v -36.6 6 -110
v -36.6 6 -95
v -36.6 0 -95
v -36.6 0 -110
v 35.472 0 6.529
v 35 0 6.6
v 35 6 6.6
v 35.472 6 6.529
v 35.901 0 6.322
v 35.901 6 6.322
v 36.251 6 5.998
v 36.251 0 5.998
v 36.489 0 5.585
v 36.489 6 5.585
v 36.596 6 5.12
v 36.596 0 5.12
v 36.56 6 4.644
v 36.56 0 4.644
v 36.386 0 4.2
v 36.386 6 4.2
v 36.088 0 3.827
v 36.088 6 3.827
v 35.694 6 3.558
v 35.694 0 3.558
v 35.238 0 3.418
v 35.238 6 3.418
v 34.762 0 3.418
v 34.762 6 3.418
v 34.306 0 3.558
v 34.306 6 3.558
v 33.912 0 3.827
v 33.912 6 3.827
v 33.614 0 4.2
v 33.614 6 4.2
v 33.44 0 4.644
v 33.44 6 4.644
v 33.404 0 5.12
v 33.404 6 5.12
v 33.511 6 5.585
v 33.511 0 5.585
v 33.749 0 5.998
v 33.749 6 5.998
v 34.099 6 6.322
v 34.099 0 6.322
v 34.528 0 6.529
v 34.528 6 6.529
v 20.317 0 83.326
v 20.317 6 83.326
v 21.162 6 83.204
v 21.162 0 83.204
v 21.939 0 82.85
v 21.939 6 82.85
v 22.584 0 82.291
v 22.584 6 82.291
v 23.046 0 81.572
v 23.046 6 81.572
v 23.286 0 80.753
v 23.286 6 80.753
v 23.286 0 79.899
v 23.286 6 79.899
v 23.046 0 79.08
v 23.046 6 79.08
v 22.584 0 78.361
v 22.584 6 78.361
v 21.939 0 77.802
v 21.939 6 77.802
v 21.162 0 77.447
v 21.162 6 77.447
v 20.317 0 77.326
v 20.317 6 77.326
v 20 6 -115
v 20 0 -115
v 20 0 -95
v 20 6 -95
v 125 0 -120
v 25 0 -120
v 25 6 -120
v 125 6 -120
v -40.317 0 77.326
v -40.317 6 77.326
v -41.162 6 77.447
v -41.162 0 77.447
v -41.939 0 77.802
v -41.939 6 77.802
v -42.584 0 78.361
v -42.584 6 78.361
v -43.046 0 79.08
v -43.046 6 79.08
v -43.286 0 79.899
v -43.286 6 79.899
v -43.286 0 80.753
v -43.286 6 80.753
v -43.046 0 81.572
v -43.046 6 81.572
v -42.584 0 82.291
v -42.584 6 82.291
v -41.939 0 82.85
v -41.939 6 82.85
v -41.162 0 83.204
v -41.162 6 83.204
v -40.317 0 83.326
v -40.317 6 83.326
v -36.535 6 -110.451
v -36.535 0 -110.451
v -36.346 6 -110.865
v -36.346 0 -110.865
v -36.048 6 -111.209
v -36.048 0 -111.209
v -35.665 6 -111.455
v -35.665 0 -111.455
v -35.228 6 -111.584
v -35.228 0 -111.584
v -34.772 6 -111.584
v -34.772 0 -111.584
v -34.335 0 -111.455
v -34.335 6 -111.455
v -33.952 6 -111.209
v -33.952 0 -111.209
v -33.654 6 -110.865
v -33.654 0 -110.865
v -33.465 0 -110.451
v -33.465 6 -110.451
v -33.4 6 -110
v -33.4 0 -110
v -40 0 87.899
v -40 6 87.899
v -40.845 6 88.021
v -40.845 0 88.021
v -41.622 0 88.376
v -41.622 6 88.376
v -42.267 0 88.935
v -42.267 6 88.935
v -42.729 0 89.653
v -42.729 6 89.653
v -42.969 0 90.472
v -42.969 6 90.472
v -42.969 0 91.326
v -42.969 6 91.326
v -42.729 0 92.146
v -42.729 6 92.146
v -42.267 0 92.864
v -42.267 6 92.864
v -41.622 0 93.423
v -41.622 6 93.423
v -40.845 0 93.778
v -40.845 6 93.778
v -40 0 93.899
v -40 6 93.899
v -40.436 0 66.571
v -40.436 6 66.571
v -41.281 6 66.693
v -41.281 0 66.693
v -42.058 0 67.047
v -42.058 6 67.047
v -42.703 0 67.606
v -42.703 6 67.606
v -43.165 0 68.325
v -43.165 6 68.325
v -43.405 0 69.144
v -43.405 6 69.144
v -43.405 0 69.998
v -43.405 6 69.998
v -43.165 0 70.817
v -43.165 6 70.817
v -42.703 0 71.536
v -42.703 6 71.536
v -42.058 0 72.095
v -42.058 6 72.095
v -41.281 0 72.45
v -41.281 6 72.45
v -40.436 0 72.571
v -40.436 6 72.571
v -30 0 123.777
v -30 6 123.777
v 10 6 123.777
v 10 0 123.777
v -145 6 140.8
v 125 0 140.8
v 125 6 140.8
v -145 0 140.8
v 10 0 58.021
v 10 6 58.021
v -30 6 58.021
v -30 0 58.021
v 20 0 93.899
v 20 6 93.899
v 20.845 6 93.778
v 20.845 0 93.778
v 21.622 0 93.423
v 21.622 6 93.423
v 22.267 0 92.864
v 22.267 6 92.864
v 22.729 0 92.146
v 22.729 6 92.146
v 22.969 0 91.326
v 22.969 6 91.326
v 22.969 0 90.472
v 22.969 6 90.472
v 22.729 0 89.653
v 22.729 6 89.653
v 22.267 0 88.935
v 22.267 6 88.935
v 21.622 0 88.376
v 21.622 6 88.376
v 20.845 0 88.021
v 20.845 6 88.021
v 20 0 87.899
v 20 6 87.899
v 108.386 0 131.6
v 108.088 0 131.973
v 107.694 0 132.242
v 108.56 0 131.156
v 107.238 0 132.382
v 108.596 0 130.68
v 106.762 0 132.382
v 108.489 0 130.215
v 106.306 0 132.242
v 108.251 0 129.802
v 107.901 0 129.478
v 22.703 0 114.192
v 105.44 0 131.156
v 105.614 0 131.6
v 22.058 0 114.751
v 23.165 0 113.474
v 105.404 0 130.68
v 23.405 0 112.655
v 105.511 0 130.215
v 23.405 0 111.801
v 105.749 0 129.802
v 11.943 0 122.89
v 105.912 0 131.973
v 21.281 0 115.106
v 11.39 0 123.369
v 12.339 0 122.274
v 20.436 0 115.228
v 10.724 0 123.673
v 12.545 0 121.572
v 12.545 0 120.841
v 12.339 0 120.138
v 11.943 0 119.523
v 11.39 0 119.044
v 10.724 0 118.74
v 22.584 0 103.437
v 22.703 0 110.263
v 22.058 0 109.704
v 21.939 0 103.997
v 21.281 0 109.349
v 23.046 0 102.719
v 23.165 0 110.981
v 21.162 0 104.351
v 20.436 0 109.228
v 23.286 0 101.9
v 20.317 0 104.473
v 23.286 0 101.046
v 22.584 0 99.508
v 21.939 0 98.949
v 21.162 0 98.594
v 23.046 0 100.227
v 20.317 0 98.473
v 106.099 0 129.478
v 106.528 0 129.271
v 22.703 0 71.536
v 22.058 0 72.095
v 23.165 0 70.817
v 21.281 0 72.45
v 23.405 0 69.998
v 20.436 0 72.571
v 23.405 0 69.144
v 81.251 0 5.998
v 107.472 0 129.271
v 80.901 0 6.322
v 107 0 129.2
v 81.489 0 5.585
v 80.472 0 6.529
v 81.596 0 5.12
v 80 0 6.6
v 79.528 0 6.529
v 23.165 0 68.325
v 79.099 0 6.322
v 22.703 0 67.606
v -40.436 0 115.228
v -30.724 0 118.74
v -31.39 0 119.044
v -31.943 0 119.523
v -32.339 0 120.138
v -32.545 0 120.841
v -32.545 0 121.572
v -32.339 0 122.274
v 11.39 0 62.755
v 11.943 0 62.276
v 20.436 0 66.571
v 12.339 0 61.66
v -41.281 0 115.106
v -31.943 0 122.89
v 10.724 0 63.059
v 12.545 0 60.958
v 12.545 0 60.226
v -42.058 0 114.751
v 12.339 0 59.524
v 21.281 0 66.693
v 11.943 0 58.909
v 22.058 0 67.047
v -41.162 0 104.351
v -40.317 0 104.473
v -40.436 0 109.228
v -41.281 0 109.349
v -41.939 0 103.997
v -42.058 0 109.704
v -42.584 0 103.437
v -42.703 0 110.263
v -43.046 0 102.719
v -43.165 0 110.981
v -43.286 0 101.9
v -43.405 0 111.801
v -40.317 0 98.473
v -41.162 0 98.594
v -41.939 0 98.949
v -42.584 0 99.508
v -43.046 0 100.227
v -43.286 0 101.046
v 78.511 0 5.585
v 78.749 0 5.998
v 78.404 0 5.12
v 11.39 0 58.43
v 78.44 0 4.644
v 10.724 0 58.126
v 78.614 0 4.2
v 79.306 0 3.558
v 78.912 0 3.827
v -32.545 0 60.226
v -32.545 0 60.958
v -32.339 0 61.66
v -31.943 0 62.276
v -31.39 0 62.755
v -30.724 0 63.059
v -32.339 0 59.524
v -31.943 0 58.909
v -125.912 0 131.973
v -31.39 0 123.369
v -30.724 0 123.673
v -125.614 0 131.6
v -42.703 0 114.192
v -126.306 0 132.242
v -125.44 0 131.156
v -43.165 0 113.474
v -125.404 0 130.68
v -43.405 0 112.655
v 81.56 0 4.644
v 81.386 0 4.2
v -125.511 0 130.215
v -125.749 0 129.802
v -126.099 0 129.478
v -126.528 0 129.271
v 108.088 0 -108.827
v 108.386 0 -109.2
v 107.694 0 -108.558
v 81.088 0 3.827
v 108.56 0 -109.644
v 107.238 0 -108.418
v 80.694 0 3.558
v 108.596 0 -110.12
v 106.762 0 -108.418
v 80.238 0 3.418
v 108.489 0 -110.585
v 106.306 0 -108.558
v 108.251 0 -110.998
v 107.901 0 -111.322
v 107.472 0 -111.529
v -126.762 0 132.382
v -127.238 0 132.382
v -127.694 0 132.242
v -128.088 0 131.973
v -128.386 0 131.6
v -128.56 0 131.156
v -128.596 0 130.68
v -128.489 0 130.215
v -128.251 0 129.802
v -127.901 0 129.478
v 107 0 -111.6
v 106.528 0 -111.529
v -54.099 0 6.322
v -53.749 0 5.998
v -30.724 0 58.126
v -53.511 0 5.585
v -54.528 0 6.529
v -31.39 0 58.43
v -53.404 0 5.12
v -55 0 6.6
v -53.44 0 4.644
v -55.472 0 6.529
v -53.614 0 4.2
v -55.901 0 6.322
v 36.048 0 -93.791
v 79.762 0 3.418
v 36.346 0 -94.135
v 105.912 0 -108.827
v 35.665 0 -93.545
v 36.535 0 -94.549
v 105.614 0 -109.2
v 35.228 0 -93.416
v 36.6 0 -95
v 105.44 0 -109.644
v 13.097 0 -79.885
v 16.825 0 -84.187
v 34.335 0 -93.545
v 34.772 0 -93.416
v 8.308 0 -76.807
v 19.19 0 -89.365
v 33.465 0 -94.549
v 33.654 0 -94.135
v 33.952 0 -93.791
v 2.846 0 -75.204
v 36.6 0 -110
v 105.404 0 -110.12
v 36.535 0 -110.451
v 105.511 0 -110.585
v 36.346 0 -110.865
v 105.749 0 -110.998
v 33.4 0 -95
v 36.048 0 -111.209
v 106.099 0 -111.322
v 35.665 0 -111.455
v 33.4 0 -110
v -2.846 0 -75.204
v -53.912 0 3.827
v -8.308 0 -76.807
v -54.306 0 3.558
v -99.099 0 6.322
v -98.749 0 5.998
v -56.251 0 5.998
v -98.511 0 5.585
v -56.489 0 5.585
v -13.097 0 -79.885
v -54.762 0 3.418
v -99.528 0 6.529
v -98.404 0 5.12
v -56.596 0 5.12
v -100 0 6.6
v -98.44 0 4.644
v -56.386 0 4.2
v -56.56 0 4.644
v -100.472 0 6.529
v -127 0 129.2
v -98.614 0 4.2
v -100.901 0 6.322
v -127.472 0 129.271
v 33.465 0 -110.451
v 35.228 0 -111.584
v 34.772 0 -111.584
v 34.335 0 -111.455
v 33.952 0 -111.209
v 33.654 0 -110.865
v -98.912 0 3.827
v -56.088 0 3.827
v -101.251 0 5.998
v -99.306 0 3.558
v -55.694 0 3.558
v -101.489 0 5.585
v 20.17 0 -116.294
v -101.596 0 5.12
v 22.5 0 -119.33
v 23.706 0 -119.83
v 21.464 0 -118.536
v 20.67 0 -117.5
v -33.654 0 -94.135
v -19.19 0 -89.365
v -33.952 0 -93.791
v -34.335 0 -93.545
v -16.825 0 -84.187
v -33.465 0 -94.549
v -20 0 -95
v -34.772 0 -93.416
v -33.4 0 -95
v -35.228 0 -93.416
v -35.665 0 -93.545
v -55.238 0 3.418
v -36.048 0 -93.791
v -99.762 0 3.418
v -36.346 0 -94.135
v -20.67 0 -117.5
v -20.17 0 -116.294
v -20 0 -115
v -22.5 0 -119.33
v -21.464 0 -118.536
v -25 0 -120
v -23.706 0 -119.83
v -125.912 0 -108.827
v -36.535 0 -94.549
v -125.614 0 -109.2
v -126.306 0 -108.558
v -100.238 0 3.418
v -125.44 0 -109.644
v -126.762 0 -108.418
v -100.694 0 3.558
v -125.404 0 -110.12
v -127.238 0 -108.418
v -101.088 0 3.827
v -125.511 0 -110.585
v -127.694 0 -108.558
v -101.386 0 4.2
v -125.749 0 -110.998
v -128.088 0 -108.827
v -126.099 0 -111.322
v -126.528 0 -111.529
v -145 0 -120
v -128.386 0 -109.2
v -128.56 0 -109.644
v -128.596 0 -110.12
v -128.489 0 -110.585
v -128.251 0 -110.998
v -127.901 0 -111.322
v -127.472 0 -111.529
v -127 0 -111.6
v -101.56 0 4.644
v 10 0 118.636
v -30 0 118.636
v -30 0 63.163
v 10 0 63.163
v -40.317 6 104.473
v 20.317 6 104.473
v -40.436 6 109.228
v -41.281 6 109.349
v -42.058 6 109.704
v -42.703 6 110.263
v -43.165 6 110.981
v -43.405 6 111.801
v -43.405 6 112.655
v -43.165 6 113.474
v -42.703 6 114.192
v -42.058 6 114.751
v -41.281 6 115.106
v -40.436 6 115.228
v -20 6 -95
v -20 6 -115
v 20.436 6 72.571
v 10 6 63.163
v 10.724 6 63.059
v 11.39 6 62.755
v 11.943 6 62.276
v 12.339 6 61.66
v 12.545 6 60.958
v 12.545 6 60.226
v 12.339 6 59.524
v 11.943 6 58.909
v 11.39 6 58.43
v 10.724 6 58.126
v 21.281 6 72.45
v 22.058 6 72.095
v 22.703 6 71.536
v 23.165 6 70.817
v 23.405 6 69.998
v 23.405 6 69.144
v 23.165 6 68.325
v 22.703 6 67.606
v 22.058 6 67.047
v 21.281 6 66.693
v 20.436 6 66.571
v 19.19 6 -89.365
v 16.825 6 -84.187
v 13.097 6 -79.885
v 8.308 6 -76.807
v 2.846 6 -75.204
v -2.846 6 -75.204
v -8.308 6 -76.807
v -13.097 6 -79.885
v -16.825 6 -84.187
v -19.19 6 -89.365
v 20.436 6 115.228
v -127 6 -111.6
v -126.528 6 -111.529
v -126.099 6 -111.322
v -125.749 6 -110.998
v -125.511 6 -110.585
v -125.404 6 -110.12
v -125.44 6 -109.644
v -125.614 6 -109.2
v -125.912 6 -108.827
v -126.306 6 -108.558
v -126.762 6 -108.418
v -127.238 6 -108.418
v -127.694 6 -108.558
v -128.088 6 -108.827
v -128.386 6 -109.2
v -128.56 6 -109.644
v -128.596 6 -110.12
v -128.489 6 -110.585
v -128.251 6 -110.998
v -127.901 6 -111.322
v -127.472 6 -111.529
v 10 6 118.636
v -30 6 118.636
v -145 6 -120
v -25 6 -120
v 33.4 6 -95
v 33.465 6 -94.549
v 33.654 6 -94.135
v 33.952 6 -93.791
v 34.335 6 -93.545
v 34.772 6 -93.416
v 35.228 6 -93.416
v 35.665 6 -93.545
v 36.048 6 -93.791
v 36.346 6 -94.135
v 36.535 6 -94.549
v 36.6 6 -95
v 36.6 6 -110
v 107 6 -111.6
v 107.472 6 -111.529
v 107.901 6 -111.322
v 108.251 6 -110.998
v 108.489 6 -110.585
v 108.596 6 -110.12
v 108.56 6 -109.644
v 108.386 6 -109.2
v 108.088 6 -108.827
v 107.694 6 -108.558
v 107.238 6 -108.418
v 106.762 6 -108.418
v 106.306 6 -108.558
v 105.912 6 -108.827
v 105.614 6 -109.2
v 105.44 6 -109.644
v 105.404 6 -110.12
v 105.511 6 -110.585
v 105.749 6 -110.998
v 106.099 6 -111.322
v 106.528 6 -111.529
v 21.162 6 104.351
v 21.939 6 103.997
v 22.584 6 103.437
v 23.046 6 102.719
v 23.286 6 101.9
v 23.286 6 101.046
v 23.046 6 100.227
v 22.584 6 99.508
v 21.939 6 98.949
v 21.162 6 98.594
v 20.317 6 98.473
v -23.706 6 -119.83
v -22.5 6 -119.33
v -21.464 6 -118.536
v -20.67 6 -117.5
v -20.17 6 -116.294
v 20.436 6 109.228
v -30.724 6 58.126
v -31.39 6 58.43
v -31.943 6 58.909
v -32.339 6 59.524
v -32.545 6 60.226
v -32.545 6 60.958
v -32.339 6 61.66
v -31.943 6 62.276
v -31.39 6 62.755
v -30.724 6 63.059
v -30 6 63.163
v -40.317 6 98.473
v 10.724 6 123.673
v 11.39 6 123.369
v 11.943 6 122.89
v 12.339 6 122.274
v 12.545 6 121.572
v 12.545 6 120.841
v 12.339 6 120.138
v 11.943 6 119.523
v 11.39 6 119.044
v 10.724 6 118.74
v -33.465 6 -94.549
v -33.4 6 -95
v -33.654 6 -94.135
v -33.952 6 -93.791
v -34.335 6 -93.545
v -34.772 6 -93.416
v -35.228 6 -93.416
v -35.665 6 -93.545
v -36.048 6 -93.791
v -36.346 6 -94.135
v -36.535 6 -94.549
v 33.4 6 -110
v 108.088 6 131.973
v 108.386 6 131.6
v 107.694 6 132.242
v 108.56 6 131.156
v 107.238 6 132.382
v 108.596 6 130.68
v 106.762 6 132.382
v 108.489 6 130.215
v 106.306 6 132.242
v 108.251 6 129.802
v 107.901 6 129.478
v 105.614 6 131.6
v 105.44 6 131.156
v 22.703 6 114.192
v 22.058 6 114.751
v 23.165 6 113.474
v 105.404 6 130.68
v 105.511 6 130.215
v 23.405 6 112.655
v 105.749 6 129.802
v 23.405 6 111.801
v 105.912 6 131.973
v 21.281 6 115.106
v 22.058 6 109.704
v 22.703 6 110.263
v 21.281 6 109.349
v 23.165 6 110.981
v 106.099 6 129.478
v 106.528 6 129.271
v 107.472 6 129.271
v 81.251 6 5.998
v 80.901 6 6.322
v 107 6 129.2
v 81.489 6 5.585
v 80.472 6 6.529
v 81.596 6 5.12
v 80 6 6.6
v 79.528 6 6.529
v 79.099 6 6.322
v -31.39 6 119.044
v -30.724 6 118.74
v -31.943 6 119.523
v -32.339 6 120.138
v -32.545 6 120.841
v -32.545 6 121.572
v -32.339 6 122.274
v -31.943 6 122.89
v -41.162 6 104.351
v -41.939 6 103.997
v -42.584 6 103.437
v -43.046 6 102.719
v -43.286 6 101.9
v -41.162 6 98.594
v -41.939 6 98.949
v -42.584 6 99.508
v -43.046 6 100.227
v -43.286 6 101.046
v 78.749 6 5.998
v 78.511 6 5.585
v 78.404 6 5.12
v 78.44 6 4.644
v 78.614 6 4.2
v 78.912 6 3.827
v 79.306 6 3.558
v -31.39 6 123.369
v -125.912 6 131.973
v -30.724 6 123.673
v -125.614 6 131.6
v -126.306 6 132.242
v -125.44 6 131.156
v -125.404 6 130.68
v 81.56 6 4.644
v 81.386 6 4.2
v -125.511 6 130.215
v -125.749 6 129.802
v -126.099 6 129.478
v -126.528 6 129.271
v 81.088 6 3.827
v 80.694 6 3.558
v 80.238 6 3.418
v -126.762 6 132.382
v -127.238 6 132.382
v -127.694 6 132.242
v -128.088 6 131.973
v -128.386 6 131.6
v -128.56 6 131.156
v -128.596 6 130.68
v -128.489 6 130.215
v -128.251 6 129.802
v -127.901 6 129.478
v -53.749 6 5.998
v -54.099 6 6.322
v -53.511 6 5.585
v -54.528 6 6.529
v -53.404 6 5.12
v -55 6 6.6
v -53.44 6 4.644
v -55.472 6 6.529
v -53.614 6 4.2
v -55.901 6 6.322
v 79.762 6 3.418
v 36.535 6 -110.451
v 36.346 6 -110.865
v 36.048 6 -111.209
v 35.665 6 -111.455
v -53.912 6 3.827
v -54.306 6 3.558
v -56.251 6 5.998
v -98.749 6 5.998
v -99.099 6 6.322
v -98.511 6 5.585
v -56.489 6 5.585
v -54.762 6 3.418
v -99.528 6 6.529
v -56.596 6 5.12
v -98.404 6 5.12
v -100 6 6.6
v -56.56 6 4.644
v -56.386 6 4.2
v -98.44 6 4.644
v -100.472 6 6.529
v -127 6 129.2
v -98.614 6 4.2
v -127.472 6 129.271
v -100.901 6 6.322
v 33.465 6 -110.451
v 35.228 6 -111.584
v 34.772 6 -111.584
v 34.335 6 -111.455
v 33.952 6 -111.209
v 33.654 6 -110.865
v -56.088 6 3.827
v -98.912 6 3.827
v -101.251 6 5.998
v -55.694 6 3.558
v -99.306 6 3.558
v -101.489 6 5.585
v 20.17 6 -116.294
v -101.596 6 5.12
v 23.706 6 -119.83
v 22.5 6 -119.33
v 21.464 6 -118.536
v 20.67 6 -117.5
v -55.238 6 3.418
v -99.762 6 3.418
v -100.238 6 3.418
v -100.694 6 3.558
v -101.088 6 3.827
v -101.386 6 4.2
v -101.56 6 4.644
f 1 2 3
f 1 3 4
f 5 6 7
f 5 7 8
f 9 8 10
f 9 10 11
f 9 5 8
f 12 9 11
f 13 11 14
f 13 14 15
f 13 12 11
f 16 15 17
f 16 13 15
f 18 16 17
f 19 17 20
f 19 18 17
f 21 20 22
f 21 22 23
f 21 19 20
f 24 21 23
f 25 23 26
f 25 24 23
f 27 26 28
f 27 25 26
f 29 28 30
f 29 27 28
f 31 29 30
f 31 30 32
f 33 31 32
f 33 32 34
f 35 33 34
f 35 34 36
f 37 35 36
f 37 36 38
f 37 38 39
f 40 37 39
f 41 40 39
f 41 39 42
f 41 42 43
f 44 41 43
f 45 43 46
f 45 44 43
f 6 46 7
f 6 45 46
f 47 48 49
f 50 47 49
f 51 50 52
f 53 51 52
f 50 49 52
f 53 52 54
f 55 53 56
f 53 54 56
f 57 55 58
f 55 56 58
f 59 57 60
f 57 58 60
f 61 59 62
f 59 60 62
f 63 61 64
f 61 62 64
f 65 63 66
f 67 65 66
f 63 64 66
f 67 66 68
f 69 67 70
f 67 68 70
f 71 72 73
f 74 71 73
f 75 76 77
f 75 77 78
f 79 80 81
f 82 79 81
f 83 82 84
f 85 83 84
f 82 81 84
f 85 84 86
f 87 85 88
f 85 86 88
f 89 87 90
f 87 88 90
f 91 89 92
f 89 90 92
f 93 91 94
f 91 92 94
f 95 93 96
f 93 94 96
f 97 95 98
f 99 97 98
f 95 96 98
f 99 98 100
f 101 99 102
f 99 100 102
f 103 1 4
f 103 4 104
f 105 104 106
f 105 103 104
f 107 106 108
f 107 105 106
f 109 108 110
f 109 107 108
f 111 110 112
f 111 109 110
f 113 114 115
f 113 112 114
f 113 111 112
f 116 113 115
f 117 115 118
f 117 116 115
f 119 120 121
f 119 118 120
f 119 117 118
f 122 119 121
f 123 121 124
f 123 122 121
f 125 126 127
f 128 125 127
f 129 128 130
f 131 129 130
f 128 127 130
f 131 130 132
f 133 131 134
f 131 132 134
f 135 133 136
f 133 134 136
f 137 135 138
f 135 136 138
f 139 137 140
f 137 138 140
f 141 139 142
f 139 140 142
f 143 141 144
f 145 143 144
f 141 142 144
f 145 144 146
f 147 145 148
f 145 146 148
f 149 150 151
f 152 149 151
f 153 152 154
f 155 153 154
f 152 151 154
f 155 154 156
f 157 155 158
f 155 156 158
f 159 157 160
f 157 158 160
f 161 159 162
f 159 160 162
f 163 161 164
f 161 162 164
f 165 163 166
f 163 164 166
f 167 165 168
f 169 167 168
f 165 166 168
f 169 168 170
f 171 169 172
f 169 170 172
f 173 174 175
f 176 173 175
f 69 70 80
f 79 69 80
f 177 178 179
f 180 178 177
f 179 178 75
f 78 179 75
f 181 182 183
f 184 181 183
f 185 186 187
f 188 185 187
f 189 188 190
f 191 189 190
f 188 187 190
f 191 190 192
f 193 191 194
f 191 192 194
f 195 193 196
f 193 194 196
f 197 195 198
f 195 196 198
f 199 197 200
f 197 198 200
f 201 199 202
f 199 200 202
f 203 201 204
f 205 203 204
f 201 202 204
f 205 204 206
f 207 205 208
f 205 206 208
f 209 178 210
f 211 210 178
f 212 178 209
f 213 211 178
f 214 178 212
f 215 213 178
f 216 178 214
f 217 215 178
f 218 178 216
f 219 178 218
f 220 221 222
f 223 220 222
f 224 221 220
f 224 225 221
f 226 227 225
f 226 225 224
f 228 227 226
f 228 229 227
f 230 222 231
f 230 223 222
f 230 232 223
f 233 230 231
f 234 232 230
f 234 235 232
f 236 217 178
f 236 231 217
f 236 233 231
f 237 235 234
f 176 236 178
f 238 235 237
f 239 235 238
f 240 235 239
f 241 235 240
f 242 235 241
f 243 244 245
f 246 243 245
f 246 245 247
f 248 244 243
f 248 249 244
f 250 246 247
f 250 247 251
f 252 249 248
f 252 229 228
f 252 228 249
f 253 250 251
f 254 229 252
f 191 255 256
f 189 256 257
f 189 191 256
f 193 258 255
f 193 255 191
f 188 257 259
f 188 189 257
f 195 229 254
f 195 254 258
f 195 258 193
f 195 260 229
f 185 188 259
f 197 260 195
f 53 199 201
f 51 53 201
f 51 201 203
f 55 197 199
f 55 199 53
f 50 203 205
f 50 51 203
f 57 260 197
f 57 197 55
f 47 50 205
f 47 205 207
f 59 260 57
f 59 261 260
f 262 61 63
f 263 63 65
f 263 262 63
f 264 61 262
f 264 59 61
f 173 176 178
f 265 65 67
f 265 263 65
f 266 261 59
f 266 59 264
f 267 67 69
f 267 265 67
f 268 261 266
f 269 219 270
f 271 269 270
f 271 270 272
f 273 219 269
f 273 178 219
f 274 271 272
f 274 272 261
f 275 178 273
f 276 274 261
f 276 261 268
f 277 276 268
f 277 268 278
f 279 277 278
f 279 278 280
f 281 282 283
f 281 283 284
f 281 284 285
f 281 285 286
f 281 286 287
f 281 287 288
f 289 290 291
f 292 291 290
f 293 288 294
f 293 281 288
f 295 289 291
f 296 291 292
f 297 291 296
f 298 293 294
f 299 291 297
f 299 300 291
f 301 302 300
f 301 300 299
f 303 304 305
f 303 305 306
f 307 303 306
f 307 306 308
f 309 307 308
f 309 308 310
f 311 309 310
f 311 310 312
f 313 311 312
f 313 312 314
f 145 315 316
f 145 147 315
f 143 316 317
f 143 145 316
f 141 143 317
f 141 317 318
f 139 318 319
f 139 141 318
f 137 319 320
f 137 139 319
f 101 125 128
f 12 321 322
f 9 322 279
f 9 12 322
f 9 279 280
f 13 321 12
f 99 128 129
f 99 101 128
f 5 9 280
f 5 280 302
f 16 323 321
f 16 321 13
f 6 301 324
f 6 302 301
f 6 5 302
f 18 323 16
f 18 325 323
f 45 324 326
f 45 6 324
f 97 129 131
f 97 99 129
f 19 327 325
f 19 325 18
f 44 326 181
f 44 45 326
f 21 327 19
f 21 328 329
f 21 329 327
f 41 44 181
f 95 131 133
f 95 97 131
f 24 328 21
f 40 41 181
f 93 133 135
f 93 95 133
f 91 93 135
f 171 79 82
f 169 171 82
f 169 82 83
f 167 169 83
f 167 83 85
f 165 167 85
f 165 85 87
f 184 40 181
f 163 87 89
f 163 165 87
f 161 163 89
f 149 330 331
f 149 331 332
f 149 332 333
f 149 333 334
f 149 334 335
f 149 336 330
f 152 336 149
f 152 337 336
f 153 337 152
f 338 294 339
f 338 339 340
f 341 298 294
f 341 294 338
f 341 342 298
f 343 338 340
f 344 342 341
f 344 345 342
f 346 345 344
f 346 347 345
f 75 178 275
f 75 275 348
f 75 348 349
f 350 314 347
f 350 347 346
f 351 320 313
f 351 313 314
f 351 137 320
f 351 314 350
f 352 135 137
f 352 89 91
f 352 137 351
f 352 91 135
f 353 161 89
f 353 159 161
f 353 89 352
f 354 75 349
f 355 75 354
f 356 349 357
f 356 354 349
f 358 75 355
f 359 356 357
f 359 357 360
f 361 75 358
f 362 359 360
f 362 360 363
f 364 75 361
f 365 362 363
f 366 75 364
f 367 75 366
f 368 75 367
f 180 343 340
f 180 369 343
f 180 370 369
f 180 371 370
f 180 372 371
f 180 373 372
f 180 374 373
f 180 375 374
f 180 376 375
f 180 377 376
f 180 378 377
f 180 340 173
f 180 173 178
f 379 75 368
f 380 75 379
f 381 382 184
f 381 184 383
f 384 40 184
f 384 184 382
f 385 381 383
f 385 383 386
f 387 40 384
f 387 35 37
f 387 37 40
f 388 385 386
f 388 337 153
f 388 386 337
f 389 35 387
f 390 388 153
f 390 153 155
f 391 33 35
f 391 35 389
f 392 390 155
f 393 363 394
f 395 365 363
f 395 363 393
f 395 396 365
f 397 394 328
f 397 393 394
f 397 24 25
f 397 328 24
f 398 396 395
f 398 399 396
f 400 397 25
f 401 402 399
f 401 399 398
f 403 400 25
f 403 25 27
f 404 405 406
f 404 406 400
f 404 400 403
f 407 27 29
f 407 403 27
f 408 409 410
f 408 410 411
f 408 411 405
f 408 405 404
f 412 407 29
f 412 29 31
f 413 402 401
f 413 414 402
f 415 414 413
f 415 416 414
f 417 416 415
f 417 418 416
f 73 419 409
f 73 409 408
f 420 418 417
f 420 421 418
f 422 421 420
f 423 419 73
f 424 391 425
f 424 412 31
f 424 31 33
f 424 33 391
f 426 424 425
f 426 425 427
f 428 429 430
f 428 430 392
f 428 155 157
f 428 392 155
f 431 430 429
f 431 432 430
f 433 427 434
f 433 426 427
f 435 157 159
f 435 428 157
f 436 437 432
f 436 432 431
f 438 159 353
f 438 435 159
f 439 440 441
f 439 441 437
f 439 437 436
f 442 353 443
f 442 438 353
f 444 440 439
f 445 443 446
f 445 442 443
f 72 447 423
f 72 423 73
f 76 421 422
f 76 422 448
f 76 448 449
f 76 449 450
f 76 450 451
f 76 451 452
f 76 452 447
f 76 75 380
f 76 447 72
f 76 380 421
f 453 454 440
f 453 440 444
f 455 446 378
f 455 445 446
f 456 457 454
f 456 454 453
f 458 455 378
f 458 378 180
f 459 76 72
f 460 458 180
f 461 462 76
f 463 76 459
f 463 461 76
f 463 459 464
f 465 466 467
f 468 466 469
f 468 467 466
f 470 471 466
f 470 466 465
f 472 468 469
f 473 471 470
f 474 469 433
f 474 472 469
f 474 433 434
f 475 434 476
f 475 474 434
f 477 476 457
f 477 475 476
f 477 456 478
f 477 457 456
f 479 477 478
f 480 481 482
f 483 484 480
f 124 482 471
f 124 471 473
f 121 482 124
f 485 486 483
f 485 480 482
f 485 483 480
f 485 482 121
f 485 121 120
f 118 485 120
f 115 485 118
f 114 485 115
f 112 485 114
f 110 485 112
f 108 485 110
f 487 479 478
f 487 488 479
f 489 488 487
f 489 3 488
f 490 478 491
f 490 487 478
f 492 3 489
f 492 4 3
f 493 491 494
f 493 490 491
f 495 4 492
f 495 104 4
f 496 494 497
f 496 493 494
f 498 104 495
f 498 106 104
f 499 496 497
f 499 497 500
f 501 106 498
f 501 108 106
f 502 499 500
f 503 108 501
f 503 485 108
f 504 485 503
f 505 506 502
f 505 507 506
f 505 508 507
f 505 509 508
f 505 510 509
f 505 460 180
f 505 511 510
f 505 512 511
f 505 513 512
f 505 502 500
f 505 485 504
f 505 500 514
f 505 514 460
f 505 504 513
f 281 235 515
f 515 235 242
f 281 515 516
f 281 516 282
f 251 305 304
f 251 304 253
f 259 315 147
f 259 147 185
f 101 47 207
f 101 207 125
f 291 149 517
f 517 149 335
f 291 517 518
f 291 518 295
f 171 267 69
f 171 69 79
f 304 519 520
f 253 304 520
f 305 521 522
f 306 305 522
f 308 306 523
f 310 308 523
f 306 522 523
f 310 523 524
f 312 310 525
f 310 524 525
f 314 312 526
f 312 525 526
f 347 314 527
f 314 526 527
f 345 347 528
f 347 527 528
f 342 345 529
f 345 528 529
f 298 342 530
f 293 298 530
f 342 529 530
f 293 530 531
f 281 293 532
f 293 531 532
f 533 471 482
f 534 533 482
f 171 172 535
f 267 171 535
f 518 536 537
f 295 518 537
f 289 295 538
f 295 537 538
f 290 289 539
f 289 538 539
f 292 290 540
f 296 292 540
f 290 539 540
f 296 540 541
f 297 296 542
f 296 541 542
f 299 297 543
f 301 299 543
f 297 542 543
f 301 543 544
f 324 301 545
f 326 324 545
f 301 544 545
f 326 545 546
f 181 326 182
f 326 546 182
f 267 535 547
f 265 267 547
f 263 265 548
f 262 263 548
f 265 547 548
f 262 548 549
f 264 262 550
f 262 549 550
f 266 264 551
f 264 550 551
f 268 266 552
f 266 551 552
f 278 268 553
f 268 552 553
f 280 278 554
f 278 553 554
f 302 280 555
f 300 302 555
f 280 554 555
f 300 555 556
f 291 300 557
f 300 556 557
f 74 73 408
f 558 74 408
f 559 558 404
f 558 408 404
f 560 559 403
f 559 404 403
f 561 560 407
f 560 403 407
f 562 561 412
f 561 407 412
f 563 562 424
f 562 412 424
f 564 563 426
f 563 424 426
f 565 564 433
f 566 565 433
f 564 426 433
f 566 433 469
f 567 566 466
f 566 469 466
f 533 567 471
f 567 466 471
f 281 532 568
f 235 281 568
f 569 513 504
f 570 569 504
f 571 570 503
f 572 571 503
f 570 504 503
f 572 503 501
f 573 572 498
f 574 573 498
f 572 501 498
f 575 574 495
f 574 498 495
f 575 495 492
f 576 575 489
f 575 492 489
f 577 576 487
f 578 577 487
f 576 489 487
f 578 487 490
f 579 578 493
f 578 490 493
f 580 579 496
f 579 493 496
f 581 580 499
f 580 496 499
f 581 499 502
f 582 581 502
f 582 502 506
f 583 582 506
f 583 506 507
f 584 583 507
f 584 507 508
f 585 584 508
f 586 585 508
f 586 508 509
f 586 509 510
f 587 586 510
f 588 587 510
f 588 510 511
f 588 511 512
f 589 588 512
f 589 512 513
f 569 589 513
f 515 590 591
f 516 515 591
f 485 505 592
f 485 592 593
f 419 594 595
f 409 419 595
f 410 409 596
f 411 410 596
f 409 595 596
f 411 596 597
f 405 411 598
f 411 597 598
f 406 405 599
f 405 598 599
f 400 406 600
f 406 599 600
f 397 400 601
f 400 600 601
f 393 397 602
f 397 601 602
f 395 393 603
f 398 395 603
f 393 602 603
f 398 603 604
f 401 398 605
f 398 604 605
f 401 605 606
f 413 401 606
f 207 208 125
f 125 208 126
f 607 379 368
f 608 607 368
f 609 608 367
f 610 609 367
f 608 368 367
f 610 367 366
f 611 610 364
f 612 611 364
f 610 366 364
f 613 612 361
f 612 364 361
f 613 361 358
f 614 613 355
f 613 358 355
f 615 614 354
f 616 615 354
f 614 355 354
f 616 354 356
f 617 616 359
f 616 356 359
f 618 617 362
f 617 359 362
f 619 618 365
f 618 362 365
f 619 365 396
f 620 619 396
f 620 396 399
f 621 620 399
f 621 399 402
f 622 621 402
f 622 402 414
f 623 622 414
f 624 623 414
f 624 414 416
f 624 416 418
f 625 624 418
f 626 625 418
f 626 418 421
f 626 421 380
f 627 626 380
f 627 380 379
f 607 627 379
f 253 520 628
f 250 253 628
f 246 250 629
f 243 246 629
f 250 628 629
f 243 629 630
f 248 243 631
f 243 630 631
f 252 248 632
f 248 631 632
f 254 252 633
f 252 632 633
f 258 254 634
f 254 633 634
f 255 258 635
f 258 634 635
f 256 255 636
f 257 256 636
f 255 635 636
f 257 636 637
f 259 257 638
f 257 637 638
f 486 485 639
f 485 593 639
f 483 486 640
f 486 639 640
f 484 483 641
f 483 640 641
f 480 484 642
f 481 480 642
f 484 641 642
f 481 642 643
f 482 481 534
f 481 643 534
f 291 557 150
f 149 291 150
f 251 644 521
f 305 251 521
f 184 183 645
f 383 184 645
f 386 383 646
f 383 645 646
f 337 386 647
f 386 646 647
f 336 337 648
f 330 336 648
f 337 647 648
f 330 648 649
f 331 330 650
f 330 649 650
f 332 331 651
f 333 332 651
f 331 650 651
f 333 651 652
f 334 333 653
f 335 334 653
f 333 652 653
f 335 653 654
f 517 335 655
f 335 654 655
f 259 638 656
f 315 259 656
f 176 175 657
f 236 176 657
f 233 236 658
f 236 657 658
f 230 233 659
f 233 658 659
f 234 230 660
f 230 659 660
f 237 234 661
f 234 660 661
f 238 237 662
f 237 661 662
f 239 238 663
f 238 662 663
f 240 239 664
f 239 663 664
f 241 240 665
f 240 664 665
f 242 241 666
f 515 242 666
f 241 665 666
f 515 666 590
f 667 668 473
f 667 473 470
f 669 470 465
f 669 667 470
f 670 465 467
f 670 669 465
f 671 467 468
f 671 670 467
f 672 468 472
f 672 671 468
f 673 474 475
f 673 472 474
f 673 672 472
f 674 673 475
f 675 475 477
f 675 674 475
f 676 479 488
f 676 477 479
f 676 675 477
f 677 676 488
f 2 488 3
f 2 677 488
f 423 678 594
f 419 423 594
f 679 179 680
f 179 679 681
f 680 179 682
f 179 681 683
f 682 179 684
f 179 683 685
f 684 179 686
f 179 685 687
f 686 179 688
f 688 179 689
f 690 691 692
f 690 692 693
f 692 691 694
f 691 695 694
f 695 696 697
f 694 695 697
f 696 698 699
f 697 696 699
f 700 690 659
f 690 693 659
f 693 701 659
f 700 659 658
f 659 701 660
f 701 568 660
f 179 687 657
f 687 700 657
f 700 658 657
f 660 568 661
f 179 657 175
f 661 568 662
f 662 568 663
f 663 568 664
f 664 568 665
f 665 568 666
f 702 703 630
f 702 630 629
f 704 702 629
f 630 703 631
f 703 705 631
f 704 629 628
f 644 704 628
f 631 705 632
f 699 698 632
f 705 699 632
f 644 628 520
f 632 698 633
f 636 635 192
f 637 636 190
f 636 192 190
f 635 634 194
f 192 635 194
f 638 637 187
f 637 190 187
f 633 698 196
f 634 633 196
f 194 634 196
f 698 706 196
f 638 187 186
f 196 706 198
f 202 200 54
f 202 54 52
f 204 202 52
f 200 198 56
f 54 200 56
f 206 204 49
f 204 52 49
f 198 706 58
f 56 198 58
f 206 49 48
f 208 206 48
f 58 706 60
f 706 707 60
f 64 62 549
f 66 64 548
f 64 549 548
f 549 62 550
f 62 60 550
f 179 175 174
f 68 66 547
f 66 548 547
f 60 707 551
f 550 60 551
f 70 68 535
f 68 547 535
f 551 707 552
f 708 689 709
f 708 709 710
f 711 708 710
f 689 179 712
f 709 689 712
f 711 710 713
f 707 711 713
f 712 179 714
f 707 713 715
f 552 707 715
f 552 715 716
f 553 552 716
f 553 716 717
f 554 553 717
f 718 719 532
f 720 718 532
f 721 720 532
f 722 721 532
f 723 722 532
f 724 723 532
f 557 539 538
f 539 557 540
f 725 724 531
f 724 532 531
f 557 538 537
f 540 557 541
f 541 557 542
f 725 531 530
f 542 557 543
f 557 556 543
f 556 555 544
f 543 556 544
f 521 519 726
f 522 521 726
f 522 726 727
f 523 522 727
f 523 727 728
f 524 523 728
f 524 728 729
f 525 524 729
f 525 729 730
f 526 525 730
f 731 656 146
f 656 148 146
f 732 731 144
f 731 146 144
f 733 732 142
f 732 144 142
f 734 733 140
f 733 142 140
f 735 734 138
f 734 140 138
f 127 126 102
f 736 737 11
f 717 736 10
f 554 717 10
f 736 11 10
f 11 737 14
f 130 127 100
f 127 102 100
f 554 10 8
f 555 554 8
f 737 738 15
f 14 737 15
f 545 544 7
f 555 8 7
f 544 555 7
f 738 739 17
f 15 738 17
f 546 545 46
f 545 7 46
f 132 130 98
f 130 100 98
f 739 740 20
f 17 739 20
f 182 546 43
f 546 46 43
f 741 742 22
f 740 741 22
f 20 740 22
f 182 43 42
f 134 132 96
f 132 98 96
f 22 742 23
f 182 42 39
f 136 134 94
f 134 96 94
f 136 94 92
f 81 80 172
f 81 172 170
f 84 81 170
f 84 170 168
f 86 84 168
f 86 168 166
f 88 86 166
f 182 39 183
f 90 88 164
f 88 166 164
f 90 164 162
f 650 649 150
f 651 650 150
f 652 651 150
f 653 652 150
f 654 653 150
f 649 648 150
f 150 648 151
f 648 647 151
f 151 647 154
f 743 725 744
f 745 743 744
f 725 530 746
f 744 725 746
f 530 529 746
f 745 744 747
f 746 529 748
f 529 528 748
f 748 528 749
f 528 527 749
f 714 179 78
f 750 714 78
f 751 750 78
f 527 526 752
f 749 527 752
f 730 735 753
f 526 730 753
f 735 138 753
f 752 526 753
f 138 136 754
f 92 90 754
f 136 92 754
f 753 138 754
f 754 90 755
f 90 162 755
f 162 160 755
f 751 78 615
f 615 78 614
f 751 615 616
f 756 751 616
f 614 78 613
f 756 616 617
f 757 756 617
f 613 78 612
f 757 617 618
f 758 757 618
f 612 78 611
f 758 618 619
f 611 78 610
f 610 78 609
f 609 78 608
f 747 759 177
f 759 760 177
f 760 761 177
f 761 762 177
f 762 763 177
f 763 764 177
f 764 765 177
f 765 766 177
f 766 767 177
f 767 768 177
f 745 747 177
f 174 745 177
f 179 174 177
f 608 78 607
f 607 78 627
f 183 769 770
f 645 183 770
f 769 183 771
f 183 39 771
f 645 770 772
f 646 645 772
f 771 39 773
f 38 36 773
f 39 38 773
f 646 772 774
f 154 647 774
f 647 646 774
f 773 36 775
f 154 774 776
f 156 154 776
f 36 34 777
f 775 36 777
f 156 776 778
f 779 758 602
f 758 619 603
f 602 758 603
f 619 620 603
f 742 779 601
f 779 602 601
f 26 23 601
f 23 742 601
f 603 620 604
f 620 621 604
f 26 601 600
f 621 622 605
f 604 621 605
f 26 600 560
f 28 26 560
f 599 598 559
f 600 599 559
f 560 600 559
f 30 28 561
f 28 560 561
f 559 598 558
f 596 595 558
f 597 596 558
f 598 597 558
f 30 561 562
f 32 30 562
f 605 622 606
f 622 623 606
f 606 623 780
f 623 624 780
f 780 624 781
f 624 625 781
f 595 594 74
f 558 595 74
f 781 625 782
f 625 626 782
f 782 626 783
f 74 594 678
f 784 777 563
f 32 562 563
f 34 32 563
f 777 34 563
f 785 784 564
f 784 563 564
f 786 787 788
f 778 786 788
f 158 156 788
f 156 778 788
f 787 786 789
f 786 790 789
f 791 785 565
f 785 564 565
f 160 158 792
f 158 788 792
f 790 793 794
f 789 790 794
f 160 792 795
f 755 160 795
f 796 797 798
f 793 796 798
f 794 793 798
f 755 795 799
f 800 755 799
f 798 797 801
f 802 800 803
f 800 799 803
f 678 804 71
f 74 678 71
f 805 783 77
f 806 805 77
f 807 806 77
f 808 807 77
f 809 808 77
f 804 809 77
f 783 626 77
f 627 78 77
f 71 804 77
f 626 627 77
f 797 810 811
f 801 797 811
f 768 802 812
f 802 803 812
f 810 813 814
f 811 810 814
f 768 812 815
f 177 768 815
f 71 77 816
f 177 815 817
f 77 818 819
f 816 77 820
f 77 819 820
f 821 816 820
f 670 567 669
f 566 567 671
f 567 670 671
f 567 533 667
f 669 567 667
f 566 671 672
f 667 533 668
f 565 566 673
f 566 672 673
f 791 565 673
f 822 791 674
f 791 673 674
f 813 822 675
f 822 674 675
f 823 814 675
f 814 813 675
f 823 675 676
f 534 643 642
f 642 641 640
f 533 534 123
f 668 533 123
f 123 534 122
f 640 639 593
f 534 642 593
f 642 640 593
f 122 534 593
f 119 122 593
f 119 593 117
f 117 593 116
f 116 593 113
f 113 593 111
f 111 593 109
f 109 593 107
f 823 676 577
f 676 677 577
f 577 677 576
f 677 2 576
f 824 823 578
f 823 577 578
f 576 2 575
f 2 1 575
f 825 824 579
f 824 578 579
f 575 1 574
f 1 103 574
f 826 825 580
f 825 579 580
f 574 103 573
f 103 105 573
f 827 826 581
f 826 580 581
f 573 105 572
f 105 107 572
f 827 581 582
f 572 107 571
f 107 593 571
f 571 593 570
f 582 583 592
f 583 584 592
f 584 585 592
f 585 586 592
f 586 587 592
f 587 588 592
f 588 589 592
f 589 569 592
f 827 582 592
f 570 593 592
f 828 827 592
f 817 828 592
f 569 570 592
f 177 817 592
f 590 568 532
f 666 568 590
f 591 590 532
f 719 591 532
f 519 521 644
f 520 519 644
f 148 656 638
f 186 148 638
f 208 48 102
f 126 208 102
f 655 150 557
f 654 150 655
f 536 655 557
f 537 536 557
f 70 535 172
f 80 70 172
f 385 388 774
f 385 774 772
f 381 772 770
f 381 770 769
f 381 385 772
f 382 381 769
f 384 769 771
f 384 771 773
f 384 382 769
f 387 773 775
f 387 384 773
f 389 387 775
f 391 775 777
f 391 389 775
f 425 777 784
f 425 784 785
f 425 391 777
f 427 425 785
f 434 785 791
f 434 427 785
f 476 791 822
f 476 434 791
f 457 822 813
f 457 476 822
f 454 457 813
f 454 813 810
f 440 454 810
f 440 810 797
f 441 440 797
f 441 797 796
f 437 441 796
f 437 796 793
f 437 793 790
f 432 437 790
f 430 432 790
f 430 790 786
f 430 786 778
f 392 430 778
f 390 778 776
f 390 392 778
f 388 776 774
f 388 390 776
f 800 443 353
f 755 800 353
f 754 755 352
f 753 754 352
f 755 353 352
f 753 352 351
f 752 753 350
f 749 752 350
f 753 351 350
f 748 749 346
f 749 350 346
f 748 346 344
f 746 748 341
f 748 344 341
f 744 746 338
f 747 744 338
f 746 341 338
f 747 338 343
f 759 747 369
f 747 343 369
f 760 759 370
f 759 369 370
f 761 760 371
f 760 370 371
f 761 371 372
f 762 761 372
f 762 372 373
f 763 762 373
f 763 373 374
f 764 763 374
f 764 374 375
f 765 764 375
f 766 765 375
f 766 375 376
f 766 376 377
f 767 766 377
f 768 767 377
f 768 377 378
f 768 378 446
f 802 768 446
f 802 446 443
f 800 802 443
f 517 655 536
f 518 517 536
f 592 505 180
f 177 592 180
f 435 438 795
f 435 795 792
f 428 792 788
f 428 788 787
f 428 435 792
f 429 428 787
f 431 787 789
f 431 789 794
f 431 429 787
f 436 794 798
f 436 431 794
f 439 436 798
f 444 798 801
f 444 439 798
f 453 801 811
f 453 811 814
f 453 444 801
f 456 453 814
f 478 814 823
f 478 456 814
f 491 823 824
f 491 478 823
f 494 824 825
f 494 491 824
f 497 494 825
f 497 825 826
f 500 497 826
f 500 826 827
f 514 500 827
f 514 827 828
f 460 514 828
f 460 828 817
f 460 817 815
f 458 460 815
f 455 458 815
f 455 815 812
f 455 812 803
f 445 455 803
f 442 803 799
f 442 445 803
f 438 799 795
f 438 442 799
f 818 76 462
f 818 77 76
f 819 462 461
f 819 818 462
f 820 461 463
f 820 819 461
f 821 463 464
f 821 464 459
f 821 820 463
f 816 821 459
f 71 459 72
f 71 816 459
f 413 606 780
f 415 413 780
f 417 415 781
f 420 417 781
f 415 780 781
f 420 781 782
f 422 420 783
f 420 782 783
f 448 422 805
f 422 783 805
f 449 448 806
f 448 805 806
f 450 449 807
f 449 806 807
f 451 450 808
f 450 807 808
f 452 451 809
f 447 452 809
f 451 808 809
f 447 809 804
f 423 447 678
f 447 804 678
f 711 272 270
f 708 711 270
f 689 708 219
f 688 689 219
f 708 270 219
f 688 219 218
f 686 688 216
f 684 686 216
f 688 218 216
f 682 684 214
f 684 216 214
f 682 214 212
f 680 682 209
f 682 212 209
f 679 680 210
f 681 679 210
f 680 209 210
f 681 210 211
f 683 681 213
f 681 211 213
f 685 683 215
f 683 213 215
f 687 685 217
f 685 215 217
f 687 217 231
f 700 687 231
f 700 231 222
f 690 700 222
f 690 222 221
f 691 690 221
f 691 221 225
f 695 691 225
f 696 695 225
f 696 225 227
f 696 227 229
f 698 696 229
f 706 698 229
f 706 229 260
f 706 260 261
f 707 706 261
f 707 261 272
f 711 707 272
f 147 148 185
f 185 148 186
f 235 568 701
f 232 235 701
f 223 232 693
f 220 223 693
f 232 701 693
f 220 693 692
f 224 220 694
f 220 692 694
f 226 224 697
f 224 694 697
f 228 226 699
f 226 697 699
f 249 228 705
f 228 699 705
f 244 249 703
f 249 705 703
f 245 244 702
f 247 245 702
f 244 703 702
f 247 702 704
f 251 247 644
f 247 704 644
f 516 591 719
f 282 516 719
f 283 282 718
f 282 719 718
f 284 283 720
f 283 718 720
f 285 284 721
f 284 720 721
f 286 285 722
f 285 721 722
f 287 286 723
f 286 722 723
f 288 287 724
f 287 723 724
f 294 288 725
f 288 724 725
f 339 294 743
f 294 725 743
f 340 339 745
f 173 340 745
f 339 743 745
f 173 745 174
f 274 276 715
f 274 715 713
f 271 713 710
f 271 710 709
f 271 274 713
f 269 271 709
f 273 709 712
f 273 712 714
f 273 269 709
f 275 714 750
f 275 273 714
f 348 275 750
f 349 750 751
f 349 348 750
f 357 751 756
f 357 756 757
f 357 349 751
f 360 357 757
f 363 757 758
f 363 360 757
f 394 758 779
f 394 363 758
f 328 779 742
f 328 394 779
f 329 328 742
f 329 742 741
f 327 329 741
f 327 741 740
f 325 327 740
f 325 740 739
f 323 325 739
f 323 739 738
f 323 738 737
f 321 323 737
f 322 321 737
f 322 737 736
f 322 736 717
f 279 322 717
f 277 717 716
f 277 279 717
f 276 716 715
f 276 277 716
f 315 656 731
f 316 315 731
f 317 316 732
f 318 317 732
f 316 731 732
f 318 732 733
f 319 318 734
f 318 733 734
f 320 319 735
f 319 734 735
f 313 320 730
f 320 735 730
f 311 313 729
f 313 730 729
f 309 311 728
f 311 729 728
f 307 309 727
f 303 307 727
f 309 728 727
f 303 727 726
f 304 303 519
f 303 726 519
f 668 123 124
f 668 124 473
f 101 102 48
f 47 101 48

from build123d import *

# Parameters (mm, degrees)
SKETCH1_R               = 1.6
BOSS_EXTRUDE1_DEPTH     = 6
CUT_EXTRUDE1_DEPTH      = 203.20197823
CUT_EXTRUDE1_DEPTH_BACK = 203.20197823
SKETCH4_R               = 1.6
CUT_EXTRUDE2_DEPTH      = 10
CUT_EXTRUDE3_DEPTH      = 10
FILLET1_R               = 5
CUT_EXTRUDE4_DEPTH      = 10
CUT_EXTRUDE4_DEPTH_BACK = 10


with BuildPart() as part:
    # Sketch1 → Boss-Extrude1 (new body)
    with BuildSketch(Plane(origin=(0, 0, 0), x_dir=(1, 0, 0), z_dir=(0, 1, 0))):
        Polygon((-145, 120), (125, 120), (125, -100.8), (125, -140.8), (-145, -140.8), (-145, -100.8), align=None)
        with Locations((-100, -5)):
            Circle(SKETCH1_R, mode=Mode.SUBTRACT)
        with Locations((80, -5)):
            Circle(SKETCH1_R, mode=Mode.SUBTRACT)
        with Locations((-55, -5)):
            Circle(SKETCH1_R, mode=Mode.SUBTRACT)
        with Locations((35, -5)):
            Circle(SKETCH1_R, mode=Mode.SUBTRACT)
    extrude(amount=BOSS_EXTRUDE1_DEPTH)

    # Sketch3 → Cut-Extrude1 (cut, two sides: drawn at the far end of the back side and taken through both)
    with BuildSketch(Plane(origin=(0, 6, 0), x_dir=(1, 0, 0), z_dir=(0, 1, 0)).offset(-CUT_EXTRUDE1_DEPTH_BACK)):
        with BuildLine():
            Line((-20, 95), (-20, 120))
            Line((-20, 120), (20, 120))
            Line((20, 120), (20, 95))
            ThreePointArc((20, 95), (0, 75), (-20, 95))
        make_face()
    extrude(amount=CUT_EXTRUDE1_DEPTH + CUT_EXTRUDE1_DEPTH_BACK, mode=Mode.SUBTRACT)

    # Sketch4 → Cut-Extrude2 (cut)
    with BuildSketch(Plane.XZ):
        with Locations((107, -110)):
            Circle(SKETCH4_R)
        with Locations((-127, -110)):
            Circle(SKETCH4_R)
        with Locations((107, 130.8)):
            Circle(SKETCH4_R)
        with Locations((-127, 130.8)):
            Circle(SKETCH4_R)
    extrude(amount=-CUT_EXTRUDE2_DEPTH, mode=Mode.SUBTRACT)

    # Sketch5 → Cut-Extrude3 (cut)
    with BuildSketch(Plane(origin=(0, 6, 0), x_dir=(1, 0, 0), z_dir=(0, 1, 0))):
        with BuildLine():
            Line((-33.4, 110), (-33.4, 95))
            ThreePointArc((-33.4, 95), (-35, 93.4), (-36.6, 95))
            Line((-36.6, 95), (-36.6, 110))
            ThreePointArc((-36.6, 110), (-35, 111.6), (-33.4, 110))
        make_face()
        with BuildLine():
            Line((33.4, 110), (33.4, 95))
            ThreePointArc((33.4, 95), (35, 93.4), (36.6, 95))
            Line((36.6, 95), (36.6, 110))
            ThreePointArc((36.6, 110), (35, 111.6), (33.4, 110))
        make_face()
    extrude(amount=-CUT_EXTRUDE3_DEPTH, mode=Mode.SUBTRACT)

    # Fillet1
    fillet1_edges = [part.edges().sort_by_distance(p)[0] for p in [
        (20, 3, -120),
        (-20, 3, -120),
    ]]
    fillet(fillet1_edges, radius=FILLET1_R)

    # Sketch6 → Cut-Extrude4 (cut, two sides: drawn at the far end of the back side and taken through both)
    with BuildSketch(Plane.XZ.offset(-CUT_EXTRUDE4_DEPTH_BACK)):
        with BuildLine():
            Line((10, 58.021465569), (-30, 58.021465569))
            ThreePointArc((-30, 58.021465569), (-32.570860459, 60.592326028), (-30, 63.163186487))
            Line((-30, 63.163186487), (10, 63.163186487))
            ThreePointArc((10, 63.163186487), (12.570860459, 60.592326028), (10, 58.021465569))
        make_face()
        with BuildLine():
            Line((20.436008981, 66.571059525), (-40.436008981, 66.571059525))
            ThreePointArc((-40.436008981, 66.571059525), (-43.436008981, 69.571059525), (-40.436008981, 72.571059525))
            Line((-40.436008981, 72.571059525), (20.436008981, 72.571059525))
            ThreePointArc((20.436008981, 72.571059525), (23.436008981, 69.571059525), (20.436008981, 66.571059525))
        make_face()
        with BuildLine():
            Line((20.316760433, 77.325947728), (-40.316760433, 77.325947728))
            ThreePointArc((-40.316760433, 77.325947728), (-43.316760433, 80.325947728), (-40.316760433, 83.325947728))
            Line((-40.316760433, 83.325947728), (20.316760433, 83.325947728))
            ThreePointArc((20.316760433, 83.325947728), (23.316760433, 80.325947728), (20.316760433, 77.325947728))
        make_face()
        with BuildLine():
            Line((-30, 123.777281933), (10, 123.777281933))
            ThreePointArc((10, 123.777281933), (12.570860459, 121.206421475), (10, 118.635561016))
            Line((10, 118.635561016), (-30, 118.635561016))
            ThreePointArc((-30, 118.635561016), (-32.570860459, 121.206421475), (-30, 123.777281933))
        make_face()
        with BuildLine():
            Line((-40.436008981, 115.227687978), (20.436008981, 115.227687978))
            ThreePointArc((20.436008981, 115.227687978), (23.436008981, 112.227687978), (20.436008981, 109.227687978))
            Line((20.436008981, 109.227687978), (-40.436008981, 109.227687978))
            ThreePointArc((-40.436008981, 109.227687978), (-43.436008981, 112.227687978), (-40.436008981, 115.227687978))
        make_face()
        with BuildLine():
            Line((-40.316760433, 104.472799775), (20.316760433, 104.472799775))
            ThreePointArc((20.316760433, 104.472799775), (23.316760433, 101.472799775), (20.316760433, 98.472799775))
            Line((20.316760433, 98.472799775), (-40.316760433, 98.472799775))
            ThreePointArc((-40.316760433, 98.472799775), (-43.316760433, 101.472799775), (-40.316760433, 104.472799775))
        make_face()
        with BuildLine():
            Line((20, 87.899373751), (-40, 87.899373751))
            ThreePointArc((-40, 87.899373751), (-43, 90.899373751), (-40, 93.899373751))
            Line((-40, 93.899373751), (20, 93.899373751))
            ThreePointArc((20, 93.899373751), (23, 90.899373751), (20, 87.899373751))
        make_face()
    extrude(amount=CUT_EXTRUDE4_DEPTH + CUT_EXTRUDE4_DEPTH_BACK, mode=Mode.SUBTRACT)


solid = part.part
